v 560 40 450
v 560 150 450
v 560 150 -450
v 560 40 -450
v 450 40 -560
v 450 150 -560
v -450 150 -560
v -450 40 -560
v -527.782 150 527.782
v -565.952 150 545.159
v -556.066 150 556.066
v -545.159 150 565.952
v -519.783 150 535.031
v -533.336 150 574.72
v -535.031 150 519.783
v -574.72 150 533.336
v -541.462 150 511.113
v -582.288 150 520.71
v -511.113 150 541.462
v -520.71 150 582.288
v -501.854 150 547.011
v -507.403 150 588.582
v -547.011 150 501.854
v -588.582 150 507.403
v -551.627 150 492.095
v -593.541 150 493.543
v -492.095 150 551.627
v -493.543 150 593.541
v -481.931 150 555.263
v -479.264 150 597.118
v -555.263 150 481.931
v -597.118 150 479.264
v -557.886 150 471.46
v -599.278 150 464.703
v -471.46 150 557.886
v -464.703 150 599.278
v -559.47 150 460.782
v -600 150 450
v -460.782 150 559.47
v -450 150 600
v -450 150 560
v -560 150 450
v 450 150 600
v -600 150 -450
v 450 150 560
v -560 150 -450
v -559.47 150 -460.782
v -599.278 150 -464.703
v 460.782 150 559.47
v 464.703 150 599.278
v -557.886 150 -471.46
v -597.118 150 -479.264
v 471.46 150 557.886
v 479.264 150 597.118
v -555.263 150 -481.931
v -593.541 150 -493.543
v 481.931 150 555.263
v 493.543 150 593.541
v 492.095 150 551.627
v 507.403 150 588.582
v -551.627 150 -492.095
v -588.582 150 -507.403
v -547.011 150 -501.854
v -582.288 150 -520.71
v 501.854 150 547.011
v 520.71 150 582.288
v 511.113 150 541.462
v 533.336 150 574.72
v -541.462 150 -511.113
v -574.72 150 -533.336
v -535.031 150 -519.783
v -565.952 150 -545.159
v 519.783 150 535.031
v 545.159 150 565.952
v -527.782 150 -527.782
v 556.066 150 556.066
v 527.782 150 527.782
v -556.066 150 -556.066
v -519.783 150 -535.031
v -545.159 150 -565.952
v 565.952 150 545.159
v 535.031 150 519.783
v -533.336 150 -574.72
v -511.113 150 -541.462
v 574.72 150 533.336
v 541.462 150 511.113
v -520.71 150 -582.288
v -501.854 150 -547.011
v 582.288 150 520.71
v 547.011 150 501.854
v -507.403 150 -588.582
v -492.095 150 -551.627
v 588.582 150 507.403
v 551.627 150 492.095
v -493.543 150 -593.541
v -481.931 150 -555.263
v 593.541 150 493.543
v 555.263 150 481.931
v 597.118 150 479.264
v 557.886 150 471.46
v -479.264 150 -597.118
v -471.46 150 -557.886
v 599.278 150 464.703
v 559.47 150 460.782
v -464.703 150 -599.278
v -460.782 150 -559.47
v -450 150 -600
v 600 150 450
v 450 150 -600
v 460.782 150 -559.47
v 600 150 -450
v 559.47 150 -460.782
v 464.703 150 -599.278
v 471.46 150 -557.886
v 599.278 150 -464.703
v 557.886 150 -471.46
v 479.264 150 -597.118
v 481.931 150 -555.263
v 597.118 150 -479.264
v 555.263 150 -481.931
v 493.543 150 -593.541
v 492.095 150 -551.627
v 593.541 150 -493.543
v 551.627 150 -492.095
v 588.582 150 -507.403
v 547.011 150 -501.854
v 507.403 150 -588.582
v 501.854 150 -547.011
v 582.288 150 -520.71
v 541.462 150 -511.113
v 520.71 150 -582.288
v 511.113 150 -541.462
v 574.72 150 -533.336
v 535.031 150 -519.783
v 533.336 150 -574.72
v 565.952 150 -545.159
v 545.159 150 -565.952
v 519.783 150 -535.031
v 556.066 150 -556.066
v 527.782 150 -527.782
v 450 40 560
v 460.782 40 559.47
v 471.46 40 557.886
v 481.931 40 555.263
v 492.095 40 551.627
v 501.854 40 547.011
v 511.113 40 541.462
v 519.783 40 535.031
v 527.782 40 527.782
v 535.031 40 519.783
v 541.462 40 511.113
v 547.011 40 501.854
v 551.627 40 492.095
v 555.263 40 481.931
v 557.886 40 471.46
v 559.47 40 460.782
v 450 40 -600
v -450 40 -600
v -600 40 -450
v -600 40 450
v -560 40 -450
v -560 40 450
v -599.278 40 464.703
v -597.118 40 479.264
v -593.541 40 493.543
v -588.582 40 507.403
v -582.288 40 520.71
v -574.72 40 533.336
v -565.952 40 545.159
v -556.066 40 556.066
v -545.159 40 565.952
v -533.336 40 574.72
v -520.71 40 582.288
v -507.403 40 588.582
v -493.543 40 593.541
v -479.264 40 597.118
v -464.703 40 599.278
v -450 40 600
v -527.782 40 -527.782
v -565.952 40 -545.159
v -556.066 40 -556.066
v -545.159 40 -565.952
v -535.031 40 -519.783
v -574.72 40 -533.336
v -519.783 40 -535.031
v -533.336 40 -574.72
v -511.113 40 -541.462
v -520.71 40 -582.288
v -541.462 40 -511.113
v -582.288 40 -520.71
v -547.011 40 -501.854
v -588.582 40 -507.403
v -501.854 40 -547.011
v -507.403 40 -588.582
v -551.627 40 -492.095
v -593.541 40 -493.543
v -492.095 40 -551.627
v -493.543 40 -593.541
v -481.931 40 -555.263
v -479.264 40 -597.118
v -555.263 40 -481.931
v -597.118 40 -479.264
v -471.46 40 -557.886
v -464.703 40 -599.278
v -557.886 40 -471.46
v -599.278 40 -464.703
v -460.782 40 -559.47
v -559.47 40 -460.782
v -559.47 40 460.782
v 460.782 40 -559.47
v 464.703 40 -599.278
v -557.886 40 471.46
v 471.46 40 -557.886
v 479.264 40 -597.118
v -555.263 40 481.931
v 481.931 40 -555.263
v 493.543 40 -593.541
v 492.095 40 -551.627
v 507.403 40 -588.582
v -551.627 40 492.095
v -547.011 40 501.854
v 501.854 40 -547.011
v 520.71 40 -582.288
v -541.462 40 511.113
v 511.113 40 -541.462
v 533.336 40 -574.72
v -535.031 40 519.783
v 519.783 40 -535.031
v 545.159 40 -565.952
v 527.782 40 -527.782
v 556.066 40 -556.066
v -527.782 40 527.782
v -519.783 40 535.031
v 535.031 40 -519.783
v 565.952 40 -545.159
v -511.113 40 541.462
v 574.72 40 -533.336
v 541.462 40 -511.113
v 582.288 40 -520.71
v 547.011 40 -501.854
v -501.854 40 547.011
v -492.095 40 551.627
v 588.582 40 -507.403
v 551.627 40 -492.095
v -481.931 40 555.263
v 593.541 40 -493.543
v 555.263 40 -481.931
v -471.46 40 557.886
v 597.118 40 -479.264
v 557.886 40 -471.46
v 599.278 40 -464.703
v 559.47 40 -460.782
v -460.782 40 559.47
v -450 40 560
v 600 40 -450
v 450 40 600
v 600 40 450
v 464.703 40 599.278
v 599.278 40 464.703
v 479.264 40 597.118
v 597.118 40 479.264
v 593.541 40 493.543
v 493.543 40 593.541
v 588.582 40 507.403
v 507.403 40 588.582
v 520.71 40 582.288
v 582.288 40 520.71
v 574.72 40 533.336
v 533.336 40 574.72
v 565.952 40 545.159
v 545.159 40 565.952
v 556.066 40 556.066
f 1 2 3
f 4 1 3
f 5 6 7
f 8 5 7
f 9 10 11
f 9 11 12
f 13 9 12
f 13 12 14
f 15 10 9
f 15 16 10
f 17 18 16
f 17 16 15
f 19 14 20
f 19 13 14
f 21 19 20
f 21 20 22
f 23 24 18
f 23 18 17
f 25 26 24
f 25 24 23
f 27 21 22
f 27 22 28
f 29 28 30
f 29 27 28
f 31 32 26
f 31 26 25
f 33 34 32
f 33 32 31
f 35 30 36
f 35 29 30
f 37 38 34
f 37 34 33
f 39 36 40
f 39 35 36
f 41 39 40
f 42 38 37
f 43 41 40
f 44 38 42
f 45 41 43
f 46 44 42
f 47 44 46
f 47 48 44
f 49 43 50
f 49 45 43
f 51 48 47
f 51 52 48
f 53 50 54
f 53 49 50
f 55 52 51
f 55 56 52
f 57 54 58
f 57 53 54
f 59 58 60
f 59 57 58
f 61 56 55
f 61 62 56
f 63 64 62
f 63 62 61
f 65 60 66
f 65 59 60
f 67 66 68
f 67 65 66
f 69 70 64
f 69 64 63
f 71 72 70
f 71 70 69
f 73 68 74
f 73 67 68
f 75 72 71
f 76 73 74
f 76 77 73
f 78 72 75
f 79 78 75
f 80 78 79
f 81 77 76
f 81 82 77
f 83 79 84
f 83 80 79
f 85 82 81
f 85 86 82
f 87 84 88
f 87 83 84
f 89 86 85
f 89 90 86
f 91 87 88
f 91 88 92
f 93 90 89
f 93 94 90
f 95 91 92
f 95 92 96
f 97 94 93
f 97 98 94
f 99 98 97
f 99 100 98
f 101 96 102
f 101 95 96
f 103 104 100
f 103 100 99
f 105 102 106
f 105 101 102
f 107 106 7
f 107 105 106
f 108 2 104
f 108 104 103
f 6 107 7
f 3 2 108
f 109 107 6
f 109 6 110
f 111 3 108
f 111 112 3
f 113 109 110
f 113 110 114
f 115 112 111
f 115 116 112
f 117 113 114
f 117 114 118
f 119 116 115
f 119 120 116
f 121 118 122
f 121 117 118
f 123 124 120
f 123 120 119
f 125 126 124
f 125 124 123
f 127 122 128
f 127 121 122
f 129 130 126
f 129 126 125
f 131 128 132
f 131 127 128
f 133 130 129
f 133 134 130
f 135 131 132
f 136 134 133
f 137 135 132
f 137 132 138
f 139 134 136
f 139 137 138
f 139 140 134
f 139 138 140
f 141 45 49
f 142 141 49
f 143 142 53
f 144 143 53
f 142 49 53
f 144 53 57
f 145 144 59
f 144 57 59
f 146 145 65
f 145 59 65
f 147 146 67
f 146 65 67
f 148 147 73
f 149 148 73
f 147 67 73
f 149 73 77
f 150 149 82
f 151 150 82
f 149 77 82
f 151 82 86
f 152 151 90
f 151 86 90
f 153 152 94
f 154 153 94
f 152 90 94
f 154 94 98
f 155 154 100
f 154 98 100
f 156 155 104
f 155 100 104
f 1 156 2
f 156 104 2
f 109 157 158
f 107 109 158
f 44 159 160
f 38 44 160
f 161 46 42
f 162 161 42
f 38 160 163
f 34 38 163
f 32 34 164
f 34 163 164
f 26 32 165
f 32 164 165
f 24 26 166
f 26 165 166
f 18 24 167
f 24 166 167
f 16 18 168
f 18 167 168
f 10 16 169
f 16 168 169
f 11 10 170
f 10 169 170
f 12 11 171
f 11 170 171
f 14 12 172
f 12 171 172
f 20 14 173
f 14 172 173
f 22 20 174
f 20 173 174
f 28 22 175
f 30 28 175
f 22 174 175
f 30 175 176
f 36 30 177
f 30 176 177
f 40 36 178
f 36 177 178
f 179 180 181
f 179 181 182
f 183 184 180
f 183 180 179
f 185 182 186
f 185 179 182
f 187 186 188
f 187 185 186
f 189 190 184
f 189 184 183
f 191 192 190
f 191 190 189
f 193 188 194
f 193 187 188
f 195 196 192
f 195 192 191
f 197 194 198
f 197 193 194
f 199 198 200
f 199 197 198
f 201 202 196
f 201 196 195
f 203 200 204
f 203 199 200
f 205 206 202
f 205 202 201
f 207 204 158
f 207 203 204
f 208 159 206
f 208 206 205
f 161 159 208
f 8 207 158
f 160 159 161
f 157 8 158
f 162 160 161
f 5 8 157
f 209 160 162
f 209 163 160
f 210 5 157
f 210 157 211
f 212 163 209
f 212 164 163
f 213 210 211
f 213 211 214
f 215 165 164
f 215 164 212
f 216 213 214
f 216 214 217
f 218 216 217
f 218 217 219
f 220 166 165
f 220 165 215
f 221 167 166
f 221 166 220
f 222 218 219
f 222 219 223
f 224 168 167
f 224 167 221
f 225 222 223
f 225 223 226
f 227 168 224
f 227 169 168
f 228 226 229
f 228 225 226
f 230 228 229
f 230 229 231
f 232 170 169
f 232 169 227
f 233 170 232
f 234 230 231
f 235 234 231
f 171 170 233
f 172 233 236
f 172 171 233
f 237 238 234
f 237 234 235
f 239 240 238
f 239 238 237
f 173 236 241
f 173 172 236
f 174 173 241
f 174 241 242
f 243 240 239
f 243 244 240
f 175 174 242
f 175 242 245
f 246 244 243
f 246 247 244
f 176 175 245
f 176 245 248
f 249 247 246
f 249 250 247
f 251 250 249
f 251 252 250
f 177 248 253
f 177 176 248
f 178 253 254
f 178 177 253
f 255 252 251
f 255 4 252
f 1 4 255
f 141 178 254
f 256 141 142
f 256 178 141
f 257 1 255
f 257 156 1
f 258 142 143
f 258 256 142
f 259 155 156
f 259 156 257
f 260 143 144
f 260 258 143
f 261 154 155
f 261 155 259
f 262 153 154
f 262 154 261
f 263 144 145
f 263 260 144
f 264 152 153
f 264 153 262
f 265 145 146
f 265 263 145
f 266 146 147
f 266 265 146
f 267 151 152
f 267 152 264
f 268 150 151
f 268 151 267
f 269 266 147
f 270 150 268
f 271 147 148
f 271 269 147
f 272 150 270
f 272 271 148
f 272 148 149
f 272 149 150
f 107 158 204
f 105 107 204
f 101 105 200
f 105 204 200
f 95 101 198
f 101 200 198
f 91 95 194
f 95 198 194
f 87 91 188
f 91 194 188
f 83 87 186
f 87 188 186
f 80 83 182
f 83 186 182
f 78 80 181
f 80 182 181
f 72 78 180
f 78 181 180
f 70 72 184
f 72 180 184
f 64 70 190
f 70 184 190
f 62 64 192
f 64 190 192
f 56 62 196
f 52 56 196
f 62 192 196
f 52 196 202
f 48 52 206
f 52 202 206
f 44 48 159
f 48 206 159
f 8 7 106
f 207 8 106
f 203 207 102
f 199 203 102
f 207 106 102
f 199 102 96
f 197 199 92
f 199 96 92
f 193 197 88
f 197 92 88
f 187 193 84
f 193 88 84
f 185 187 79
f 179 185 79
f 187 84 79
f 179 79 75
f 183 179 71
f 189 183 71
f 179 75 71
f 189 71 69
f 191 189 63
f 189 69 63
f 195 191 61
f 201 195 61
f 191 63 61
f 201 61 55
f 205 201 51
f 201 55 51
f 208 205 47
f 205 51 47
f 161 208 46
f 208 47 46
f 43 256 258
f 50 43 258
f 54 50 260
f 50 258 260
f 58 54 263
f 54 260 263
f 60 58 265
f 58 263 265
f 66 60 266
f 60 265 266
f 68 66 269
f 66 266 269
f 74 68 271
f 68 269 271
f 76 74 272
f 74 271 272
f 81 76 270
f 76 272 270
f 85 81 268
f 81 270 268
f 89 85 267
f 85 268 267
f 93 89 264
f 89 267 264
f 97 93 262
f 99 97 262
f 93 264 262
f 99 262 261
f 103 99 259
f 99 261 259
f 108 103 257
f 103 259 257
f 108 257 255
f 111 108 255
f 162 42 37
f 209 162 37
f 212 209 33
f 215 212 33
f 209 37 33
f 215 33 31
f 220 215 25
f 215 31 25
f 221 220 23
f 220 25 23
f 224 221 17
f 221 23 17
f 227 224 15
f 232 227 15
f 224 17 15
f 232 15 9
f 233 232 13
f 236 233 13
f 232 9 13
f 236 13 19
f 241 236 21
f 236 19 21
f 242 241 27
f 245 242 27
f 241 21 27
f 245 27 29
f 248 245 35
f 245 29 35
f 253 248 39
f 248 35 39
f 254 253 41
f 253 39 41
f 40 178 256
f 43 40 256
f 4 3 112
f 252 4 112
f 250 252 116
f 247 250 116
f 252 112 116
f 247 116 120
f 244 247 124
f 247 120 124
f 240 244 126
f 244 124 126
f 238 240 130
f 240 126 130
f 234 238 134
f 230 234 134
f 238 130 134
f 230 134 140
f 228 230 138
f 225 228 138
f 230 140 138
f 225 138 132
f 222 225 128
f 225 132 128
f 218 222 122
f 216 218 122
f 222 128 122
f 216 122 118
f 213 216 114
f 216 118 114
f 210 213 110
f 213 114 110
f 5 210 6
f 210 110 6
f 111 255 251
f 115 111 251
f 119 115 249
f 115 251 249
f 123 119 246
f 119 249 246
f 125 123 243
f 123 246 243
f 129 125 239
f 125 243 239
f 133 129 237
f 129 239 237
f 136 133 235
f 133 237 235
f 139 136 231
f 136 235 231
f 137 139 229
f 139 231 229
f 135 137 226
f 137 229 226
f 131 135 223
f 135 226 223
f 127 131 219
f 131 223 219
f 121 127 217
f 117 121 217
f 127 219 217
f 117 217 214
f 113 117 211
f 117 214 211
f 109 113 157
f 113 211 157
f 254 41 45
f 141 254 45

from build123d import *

# Parameters (mm, degrees)
BOSS_EXTRUDE1_DEPTH = 150
CUT_EXTRUDE1_DEPTH  = 110
SKETCH3_R           = 52.074473314
CUT_EXTRUDE2_DEPTH  = 110
CUT_EXTRUDE4_DEPTH  = 40


with BuildPart() as part:
    # Sketch1 → Boss-Extrude1 (new body)
    with BuildSketch(Plane(origin=(0, 0, 0), x_dir=(1, 0, 0), z_dir=(0, 1, 0))):
        with BuildLine():
            Line((-450, -600), (450, -600))
            ThreePointArc((450, -600), (556.066017178, -556.066017178), (600, -450))
            Line((600, -450), (600, 450))
            ThreePointArc((600, 450), (556.066017178, 556.066017178), (450, 600))
            Line((450, 600), (-450, 600))
            ThreePointArc((-450, 600), (-556.066017178, 556.066017178), (-600, 450))
            Line((-600, 450), (-600, -450))
            ThreePointArc((-600, -450), (-556.066017178, -556.066017178), (-450, -600))
        make_face()
    extrude(amount=BOSS_EXTRUDE1_DEPTH)

    # Sketch2 → Cut-Extrude1 (cut)
    with BuildSketch(Plane(origin=(0, 150, 0), x_dir=(1, 0, 0), z_dir=(0, 1, 0))):
        with BuildLine():
            Line((450, 560), (-450, 560))
            ThreePointArc((-450, 560), (-527.781745931, 527.781745931), (-560, 450))
            Line((-560, 450), (-560, -450))
            ThreePointArc((-560, -450), (-527.781745931, -527.781745931), (-450, -560))
            Line((-450, -560), (450, -560))
            ThreePointArc((450, -560), (527.781745931, -527.781745931), (560, -450))
            Line((560, -450), (560, 450))
            ThreePointArc((560, 450), (527.781745931, 527.781745931), (450, 560))
        make_face()
    extrude(amount=-CUT_EXTRUDE1_DEPTH, mode=Mode.SUBTRACT)

    # Sketch3 → Cut-Extrude2 (cut)
    with BuildSketch(Plane(origin=(0, 40, 0), x_dir=(1, 0, 0), z_dir=(0, 1, 0))):
        with Locations((249.348788186, 217.558417351)):
            Circle(SKETCH3_R)
    extrude(amount=-CUT_EXTRUDE2_DEPTH, mode=Mode.SUBTRACT)

    # Sketch7 → Cut-Extrude4 (cut)
    with BuildSketch(Plane.XZ):
        with BuildLine():
            Line((600, -450), (600, 450))
            ThreePointArc((600, 450), (556.066017178, 556.066017178), (450, 600))
            Line((450, 600), (-450, 600))
            ThreePointArc((-450, 600), (-556.066017178, 556.066017178), (-600, 450))
            Line((-600, 450), (-600, -450))
            ThreePointArc((-600, -450), (-556.066017178, -556.066017178), (-450, -600))
            Line((-450, -600), (450, -600))
            ThreePointArc((450, -600), (556.066017178, -556.066017178), (600, -450))
        make_face()
    extrude(amount=-CUT_EXTRUDE4_DEPTH, mode=Mode.SUBTRACT)


solid = part.part
